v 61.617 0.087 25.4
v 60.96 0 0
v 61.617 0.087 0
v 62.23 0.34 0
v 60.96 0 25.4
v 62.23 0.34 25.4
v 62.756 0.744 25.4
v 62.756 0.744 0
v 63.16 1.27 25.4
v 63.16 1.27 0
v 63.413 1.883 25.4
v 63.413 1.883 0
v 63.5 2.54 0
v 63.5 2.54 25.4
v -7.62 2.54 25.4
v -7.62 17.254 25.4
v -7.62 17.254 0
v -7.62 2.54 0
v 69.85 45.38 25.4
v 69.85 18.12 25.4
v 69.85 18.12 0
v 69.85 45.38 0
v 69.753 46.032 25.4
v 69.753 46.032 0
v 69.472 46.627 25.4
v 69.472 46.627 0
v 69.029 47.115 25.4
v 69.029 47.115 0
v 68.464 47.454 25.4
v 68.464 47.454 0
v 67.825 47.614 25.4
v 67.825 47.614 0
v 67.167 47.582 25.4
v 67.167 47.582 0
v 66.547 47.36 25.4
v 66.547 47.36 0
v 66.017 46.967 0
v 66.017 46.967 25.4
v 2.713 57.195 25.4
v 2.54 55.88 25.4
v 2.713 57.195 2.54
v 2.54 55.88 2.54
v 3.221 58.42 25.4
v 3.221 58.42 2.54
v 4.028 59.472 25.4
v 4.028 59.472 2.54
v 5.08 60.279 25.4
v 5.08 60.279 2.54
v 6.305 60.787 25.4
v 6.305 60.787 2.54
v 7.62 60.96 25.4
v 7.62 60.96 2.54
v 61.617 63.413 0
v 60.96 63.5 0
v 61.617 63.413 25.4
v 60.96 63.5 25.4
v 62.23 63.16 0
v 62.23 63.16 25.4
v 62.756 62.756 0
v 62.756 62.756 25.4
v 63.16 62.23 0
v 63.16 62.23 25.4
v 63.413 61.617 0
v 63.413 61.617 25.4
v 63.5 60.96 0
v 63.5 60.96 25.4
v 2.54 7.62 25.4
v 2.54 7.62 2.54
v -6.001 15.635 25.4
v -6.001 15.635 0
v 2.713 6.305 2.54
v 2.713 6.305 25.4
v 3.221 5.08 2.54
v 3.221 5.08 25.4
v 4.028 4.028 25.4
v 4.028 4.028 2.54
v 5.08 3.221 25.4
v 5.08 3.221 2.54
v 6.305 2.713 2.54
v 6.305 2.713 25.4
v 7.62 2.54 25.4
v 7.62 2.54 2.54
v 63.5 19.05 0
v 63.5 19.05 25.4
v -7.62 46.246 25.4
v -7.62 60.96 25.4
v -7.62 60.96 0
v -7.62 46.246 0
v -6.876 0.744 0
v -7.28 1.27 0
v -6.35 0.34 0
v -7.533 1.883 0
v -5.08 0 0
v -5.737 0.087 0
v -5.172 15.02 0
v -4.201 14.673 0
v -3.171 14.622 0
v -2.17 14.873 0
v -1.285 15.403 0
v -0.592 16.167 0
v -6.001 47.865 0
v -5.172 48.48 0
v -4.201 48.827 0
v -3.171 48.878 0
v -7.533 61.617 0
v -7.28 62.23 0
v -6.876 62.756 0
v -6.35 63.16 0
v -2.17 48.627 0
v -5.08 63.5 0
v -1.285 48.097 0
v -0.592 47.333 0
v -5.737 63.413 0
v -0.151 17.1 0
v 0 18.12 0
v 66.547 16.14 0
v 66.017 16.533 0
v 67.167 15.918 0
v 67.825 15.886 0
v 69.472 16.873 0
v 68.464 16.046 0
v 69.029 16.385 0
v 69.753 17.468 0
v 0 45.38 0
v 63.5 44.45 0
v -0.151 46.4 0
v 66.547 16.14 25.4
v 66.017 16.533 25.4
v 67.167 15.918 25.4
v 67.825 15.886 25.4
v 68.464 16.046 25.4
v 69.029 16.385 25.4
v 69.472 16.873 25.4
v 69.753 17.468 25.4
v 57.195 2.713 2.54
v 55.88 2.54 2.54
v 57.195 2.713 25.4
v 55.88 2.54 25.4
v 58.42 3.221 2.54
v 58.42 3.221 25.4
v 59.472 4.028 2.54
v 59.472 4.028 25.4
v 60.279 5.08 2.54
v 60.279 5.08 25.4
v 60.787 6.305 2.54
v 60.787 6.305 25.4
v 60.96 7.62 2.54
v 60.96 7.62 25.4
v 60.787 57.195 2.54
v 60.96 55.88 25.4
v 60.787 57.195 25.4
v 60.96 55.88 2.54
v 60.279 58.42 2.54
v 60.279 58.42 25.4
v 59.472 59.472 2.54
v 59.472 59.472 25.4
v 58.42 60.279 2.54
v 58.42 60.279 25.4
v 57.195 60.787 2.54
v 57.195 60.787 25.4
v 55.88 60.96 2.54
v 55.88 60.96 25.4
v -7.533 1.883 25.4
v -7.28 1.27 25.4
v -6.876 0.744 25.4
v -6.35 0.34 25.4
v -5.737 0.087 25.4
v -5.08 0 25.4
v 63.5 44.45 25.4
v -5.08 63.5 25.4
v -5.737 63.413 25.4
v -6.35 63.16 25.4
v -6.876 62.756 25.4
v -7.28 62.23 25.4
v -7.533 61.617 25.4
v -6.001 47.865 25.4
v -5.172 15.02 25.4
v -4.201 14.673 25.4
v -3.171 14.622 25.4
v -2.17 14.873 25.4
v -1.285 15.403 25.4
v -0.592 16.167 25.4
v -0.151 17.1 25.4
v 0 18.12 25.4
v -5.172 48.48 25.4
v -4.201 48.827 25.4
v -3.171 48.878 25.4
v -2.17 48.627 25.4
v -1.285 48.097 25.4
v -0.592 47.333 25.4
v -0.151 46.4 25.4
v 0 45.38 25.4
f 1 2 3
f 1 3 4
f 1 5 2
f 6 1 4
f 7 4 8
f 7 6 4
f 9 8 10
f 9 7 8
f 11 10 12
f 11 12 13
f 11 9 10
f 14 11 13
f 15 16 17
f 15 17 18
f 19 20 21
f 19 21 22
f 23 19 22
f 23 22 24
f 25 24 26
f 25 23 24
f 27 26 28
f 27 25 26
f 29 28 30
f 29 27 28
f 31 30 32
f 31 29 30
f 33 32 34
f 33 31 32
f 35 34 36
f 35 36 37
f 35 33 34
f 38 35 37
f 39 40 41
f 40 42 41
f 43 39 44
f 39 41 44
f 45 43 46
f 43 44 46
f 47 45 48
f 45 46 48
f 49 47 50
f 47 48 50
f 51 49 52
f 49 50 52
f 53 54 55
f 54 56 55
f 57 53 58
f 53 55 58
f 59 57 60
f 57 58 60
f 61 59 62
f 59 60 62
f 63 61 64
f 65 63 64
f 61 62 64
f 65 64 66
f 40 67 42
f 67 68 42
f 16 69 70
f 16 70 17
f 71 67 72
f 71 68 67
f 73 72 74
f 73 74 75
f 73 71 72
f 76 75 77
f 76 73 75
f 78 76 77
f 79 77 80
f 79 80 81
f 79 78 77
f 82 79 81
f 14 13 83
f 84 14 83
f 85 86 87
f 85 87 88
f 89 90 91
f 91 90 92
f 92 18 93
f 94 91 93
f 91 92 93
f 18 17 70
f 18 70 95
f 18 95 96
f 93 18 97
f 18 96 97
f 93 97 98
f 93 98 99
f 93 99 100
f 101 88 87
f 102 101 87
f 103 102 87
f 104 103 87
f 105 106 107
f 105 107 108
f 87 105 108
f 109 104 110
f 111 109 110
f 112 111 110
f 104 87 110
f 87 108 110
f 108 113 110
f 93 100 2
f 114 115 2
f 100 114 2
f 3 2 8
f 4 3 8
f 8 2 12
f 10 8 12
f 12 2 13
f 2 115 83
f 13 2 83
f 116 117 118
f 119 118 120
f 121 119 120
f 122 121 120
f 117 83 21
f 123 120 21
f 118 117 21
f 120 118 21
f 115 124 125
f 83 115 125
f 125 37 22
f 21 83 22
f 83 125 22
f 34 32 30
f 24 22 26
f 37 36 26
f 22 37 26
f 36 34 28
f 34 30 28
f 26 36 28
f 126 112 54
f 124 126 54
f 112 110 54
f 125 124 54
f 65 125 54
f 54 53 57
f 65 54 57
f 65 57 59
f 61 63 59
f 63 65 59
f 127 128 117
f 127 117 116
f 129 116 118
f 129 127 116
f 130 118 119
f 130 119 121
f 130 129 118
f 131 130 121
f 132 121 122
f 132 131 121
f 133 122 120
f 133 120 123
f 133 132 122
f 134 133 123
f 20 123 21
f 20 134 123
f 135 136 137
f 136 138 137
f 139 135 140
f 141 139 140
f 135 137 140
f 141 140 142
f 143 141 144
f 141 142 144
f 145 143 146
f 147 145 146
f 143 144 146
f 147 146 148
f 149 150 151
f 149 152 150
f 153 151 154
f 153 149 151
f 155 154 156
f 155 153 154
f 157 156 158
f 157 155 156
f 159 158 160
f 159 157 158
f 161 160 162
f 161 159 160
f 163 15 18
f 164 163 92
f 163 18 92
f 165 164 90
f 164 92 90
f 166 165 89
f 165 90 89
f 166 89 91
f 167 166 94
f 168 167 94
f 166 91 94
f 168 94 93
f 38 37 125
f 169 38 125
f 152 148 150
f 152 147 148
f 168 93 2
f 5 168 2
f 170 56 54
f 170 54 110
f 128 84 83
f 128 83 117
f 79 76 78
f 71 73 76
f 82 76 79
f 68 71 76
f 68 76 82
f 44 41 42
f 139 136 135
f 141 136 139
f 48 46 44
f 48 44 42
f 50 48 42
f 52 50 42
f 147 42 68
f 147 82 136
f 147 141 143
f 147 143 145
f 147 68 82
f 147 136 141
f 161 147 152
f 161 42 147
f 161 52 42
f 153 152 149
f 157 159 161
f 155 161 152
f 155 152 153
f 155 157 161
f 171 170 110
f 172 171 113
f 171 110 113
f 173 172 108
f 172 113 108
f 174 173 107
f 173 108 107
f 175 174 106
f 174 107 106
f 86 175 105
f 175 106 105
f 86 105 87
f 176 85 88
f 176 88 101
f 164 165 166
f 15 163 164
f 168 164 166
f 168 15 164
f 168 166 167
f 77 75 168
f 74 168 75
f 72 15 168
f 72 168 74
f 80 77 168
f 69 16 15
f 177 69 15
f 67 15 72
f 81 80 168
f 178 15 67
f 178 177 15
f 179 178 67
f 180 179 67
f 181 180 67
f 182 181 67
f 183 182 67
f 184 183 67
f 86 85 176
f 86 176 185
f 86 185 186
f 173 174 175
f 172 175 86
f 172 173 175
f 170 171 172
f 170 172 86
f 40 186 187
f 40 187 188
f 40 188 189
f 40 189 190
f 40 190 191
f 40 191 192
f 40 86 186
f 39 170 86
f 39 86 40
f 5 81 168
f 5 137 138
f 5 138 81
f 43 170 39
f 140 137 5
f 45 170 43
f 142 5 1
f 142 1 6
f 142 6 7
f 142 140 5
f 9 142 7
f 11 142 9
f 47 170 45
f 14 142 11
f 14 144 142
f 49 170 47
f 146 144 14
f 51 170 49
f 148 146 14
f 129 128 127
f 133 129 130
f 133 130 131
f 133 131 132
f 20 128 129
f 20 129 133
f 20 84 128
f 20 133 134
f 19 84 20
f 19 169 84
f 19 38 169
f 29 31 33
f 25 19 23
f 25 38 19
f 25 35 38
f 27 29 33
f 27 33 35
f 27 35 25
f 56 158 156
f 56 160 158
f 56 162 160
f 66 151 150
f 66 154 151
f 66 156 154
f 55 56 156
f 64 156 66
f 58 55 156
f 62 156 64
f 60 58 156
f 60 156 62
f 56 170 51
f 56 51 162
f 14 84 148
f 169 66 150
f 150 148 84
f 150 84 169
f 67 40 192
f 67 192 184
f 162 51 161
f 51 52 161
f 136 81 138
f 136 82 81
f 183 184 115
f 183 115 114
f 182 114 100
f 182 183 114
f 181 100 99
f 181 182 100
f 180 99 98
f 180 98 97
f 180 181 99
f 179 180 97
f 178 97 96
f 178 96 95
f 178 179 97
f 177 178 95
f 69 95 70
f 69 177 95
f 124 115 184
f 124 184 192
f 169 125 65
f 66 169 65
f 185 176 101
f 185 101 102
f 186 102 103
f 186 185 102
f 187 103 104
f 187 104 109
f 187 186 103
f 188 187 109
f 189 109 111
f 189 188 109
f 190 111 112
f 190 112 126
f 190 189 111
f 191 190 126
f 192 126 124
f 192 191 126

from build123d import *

# Parameters (mm, degrees)
F0_W     = 63.5
F0_H     = 63.5
F1_DEPTH = 25.4
F2_T     = -2.54
F4_DEPTH = 25.4
F5_R     = 5.08
F6_R     = 2.54


with BuildPart() as f1:
    # F0 (on Top) → F1 (new body)
    with BuildSketch(Plane.XY):
        with Locations((31.75, 31.75)):
            Rectangle(F0_W, F0_H)
    extrude(amount=F1_DEPTH)

    # F2
    f2_openings = [f1.faces().sort_by_distance(p)[0] for p in [
        (31.75, 31.75, 25.4),
    ]]
    offset(amount=F2_T, openings=f2_openings)

    # F3 (on face) → F4 (join, through all)
    with BuildSketch(Plane.XY.offset(25.4)):
        with BuildLine():
            Line((66.0174359697, 46.9674359697), (63.5, 44.45))
            Line((63.5, 44.45), (63.5, 19.05))
            Line((63.5, 19.05), (66.0174359697, 16.5325640303))
            ThreePointArc((66.0174359697, 16.5325640303), (68.4640847787, 16.0458953235), (69.85, 18.1200640303))
            Line((69.85, 18.1200640303), (69.85, 45.3799359697))
            ThreePointArc((69.85, 45.3799359697), (68.4640847787, 47.4541046765), (66.0174359697, 46.9674359697))
        make_face()
        with BuildLine():
            Line((0, 45.3799359697), (0, 63.5))
            Line((0, 63.5), (-7.62, 63.5))
            Line((-7.62, 63.5), (-7.62, 46.2460512242))
            Line((-7.62, 46.2460512242), (-6.0005896424, 47.8654615818))
            ThreePointArc((-6.0005896424, 47.8654615818), (-2.1699072622, 48.6274316828), (0, 45.3799359697))
        make_face()
        with BuildLine():
            Line((-6.0005896424, 15.6345384182), (-7.62, 17.2539487758))
            Line((-7.62, 17.2539487758), (-7.62, 0))
            Line((-7.62, 0), (0, 0))
            Line((0, 0), (0, 18.1200640303))
            ThreePointArc((0, 18.1200640303), (-2.1699072622, 14.8725683172), (-6.0005896424, 15.6345384182))
        make_face()
    extrude(amount=-F4_DEPTH)

    # F5
    f5_edges = [f1.edges().sort_by_distance(p)[0] for p in [
        (2.54, 60.96, 13.97),
        (60.96, 60.96, 13.97),
        (2.54, 2.54, 13.97),
        (60.96, 2.54, 13.97),
    ]]
    fillet(f5_edges, radius=F5_R)

    # F6
    f6_edges = [f1.edges().sort_by_distance(p)[0] for p in [
        (-7.62, 63.5, 12.7),
        (63.5, 63.5, 12.7),
        (63.5, 0, 12.7),
        (-7.62, 0, 12.7),
    ]]
    fillet(f6_edges, radius=F6_R)


solid = f1.part
